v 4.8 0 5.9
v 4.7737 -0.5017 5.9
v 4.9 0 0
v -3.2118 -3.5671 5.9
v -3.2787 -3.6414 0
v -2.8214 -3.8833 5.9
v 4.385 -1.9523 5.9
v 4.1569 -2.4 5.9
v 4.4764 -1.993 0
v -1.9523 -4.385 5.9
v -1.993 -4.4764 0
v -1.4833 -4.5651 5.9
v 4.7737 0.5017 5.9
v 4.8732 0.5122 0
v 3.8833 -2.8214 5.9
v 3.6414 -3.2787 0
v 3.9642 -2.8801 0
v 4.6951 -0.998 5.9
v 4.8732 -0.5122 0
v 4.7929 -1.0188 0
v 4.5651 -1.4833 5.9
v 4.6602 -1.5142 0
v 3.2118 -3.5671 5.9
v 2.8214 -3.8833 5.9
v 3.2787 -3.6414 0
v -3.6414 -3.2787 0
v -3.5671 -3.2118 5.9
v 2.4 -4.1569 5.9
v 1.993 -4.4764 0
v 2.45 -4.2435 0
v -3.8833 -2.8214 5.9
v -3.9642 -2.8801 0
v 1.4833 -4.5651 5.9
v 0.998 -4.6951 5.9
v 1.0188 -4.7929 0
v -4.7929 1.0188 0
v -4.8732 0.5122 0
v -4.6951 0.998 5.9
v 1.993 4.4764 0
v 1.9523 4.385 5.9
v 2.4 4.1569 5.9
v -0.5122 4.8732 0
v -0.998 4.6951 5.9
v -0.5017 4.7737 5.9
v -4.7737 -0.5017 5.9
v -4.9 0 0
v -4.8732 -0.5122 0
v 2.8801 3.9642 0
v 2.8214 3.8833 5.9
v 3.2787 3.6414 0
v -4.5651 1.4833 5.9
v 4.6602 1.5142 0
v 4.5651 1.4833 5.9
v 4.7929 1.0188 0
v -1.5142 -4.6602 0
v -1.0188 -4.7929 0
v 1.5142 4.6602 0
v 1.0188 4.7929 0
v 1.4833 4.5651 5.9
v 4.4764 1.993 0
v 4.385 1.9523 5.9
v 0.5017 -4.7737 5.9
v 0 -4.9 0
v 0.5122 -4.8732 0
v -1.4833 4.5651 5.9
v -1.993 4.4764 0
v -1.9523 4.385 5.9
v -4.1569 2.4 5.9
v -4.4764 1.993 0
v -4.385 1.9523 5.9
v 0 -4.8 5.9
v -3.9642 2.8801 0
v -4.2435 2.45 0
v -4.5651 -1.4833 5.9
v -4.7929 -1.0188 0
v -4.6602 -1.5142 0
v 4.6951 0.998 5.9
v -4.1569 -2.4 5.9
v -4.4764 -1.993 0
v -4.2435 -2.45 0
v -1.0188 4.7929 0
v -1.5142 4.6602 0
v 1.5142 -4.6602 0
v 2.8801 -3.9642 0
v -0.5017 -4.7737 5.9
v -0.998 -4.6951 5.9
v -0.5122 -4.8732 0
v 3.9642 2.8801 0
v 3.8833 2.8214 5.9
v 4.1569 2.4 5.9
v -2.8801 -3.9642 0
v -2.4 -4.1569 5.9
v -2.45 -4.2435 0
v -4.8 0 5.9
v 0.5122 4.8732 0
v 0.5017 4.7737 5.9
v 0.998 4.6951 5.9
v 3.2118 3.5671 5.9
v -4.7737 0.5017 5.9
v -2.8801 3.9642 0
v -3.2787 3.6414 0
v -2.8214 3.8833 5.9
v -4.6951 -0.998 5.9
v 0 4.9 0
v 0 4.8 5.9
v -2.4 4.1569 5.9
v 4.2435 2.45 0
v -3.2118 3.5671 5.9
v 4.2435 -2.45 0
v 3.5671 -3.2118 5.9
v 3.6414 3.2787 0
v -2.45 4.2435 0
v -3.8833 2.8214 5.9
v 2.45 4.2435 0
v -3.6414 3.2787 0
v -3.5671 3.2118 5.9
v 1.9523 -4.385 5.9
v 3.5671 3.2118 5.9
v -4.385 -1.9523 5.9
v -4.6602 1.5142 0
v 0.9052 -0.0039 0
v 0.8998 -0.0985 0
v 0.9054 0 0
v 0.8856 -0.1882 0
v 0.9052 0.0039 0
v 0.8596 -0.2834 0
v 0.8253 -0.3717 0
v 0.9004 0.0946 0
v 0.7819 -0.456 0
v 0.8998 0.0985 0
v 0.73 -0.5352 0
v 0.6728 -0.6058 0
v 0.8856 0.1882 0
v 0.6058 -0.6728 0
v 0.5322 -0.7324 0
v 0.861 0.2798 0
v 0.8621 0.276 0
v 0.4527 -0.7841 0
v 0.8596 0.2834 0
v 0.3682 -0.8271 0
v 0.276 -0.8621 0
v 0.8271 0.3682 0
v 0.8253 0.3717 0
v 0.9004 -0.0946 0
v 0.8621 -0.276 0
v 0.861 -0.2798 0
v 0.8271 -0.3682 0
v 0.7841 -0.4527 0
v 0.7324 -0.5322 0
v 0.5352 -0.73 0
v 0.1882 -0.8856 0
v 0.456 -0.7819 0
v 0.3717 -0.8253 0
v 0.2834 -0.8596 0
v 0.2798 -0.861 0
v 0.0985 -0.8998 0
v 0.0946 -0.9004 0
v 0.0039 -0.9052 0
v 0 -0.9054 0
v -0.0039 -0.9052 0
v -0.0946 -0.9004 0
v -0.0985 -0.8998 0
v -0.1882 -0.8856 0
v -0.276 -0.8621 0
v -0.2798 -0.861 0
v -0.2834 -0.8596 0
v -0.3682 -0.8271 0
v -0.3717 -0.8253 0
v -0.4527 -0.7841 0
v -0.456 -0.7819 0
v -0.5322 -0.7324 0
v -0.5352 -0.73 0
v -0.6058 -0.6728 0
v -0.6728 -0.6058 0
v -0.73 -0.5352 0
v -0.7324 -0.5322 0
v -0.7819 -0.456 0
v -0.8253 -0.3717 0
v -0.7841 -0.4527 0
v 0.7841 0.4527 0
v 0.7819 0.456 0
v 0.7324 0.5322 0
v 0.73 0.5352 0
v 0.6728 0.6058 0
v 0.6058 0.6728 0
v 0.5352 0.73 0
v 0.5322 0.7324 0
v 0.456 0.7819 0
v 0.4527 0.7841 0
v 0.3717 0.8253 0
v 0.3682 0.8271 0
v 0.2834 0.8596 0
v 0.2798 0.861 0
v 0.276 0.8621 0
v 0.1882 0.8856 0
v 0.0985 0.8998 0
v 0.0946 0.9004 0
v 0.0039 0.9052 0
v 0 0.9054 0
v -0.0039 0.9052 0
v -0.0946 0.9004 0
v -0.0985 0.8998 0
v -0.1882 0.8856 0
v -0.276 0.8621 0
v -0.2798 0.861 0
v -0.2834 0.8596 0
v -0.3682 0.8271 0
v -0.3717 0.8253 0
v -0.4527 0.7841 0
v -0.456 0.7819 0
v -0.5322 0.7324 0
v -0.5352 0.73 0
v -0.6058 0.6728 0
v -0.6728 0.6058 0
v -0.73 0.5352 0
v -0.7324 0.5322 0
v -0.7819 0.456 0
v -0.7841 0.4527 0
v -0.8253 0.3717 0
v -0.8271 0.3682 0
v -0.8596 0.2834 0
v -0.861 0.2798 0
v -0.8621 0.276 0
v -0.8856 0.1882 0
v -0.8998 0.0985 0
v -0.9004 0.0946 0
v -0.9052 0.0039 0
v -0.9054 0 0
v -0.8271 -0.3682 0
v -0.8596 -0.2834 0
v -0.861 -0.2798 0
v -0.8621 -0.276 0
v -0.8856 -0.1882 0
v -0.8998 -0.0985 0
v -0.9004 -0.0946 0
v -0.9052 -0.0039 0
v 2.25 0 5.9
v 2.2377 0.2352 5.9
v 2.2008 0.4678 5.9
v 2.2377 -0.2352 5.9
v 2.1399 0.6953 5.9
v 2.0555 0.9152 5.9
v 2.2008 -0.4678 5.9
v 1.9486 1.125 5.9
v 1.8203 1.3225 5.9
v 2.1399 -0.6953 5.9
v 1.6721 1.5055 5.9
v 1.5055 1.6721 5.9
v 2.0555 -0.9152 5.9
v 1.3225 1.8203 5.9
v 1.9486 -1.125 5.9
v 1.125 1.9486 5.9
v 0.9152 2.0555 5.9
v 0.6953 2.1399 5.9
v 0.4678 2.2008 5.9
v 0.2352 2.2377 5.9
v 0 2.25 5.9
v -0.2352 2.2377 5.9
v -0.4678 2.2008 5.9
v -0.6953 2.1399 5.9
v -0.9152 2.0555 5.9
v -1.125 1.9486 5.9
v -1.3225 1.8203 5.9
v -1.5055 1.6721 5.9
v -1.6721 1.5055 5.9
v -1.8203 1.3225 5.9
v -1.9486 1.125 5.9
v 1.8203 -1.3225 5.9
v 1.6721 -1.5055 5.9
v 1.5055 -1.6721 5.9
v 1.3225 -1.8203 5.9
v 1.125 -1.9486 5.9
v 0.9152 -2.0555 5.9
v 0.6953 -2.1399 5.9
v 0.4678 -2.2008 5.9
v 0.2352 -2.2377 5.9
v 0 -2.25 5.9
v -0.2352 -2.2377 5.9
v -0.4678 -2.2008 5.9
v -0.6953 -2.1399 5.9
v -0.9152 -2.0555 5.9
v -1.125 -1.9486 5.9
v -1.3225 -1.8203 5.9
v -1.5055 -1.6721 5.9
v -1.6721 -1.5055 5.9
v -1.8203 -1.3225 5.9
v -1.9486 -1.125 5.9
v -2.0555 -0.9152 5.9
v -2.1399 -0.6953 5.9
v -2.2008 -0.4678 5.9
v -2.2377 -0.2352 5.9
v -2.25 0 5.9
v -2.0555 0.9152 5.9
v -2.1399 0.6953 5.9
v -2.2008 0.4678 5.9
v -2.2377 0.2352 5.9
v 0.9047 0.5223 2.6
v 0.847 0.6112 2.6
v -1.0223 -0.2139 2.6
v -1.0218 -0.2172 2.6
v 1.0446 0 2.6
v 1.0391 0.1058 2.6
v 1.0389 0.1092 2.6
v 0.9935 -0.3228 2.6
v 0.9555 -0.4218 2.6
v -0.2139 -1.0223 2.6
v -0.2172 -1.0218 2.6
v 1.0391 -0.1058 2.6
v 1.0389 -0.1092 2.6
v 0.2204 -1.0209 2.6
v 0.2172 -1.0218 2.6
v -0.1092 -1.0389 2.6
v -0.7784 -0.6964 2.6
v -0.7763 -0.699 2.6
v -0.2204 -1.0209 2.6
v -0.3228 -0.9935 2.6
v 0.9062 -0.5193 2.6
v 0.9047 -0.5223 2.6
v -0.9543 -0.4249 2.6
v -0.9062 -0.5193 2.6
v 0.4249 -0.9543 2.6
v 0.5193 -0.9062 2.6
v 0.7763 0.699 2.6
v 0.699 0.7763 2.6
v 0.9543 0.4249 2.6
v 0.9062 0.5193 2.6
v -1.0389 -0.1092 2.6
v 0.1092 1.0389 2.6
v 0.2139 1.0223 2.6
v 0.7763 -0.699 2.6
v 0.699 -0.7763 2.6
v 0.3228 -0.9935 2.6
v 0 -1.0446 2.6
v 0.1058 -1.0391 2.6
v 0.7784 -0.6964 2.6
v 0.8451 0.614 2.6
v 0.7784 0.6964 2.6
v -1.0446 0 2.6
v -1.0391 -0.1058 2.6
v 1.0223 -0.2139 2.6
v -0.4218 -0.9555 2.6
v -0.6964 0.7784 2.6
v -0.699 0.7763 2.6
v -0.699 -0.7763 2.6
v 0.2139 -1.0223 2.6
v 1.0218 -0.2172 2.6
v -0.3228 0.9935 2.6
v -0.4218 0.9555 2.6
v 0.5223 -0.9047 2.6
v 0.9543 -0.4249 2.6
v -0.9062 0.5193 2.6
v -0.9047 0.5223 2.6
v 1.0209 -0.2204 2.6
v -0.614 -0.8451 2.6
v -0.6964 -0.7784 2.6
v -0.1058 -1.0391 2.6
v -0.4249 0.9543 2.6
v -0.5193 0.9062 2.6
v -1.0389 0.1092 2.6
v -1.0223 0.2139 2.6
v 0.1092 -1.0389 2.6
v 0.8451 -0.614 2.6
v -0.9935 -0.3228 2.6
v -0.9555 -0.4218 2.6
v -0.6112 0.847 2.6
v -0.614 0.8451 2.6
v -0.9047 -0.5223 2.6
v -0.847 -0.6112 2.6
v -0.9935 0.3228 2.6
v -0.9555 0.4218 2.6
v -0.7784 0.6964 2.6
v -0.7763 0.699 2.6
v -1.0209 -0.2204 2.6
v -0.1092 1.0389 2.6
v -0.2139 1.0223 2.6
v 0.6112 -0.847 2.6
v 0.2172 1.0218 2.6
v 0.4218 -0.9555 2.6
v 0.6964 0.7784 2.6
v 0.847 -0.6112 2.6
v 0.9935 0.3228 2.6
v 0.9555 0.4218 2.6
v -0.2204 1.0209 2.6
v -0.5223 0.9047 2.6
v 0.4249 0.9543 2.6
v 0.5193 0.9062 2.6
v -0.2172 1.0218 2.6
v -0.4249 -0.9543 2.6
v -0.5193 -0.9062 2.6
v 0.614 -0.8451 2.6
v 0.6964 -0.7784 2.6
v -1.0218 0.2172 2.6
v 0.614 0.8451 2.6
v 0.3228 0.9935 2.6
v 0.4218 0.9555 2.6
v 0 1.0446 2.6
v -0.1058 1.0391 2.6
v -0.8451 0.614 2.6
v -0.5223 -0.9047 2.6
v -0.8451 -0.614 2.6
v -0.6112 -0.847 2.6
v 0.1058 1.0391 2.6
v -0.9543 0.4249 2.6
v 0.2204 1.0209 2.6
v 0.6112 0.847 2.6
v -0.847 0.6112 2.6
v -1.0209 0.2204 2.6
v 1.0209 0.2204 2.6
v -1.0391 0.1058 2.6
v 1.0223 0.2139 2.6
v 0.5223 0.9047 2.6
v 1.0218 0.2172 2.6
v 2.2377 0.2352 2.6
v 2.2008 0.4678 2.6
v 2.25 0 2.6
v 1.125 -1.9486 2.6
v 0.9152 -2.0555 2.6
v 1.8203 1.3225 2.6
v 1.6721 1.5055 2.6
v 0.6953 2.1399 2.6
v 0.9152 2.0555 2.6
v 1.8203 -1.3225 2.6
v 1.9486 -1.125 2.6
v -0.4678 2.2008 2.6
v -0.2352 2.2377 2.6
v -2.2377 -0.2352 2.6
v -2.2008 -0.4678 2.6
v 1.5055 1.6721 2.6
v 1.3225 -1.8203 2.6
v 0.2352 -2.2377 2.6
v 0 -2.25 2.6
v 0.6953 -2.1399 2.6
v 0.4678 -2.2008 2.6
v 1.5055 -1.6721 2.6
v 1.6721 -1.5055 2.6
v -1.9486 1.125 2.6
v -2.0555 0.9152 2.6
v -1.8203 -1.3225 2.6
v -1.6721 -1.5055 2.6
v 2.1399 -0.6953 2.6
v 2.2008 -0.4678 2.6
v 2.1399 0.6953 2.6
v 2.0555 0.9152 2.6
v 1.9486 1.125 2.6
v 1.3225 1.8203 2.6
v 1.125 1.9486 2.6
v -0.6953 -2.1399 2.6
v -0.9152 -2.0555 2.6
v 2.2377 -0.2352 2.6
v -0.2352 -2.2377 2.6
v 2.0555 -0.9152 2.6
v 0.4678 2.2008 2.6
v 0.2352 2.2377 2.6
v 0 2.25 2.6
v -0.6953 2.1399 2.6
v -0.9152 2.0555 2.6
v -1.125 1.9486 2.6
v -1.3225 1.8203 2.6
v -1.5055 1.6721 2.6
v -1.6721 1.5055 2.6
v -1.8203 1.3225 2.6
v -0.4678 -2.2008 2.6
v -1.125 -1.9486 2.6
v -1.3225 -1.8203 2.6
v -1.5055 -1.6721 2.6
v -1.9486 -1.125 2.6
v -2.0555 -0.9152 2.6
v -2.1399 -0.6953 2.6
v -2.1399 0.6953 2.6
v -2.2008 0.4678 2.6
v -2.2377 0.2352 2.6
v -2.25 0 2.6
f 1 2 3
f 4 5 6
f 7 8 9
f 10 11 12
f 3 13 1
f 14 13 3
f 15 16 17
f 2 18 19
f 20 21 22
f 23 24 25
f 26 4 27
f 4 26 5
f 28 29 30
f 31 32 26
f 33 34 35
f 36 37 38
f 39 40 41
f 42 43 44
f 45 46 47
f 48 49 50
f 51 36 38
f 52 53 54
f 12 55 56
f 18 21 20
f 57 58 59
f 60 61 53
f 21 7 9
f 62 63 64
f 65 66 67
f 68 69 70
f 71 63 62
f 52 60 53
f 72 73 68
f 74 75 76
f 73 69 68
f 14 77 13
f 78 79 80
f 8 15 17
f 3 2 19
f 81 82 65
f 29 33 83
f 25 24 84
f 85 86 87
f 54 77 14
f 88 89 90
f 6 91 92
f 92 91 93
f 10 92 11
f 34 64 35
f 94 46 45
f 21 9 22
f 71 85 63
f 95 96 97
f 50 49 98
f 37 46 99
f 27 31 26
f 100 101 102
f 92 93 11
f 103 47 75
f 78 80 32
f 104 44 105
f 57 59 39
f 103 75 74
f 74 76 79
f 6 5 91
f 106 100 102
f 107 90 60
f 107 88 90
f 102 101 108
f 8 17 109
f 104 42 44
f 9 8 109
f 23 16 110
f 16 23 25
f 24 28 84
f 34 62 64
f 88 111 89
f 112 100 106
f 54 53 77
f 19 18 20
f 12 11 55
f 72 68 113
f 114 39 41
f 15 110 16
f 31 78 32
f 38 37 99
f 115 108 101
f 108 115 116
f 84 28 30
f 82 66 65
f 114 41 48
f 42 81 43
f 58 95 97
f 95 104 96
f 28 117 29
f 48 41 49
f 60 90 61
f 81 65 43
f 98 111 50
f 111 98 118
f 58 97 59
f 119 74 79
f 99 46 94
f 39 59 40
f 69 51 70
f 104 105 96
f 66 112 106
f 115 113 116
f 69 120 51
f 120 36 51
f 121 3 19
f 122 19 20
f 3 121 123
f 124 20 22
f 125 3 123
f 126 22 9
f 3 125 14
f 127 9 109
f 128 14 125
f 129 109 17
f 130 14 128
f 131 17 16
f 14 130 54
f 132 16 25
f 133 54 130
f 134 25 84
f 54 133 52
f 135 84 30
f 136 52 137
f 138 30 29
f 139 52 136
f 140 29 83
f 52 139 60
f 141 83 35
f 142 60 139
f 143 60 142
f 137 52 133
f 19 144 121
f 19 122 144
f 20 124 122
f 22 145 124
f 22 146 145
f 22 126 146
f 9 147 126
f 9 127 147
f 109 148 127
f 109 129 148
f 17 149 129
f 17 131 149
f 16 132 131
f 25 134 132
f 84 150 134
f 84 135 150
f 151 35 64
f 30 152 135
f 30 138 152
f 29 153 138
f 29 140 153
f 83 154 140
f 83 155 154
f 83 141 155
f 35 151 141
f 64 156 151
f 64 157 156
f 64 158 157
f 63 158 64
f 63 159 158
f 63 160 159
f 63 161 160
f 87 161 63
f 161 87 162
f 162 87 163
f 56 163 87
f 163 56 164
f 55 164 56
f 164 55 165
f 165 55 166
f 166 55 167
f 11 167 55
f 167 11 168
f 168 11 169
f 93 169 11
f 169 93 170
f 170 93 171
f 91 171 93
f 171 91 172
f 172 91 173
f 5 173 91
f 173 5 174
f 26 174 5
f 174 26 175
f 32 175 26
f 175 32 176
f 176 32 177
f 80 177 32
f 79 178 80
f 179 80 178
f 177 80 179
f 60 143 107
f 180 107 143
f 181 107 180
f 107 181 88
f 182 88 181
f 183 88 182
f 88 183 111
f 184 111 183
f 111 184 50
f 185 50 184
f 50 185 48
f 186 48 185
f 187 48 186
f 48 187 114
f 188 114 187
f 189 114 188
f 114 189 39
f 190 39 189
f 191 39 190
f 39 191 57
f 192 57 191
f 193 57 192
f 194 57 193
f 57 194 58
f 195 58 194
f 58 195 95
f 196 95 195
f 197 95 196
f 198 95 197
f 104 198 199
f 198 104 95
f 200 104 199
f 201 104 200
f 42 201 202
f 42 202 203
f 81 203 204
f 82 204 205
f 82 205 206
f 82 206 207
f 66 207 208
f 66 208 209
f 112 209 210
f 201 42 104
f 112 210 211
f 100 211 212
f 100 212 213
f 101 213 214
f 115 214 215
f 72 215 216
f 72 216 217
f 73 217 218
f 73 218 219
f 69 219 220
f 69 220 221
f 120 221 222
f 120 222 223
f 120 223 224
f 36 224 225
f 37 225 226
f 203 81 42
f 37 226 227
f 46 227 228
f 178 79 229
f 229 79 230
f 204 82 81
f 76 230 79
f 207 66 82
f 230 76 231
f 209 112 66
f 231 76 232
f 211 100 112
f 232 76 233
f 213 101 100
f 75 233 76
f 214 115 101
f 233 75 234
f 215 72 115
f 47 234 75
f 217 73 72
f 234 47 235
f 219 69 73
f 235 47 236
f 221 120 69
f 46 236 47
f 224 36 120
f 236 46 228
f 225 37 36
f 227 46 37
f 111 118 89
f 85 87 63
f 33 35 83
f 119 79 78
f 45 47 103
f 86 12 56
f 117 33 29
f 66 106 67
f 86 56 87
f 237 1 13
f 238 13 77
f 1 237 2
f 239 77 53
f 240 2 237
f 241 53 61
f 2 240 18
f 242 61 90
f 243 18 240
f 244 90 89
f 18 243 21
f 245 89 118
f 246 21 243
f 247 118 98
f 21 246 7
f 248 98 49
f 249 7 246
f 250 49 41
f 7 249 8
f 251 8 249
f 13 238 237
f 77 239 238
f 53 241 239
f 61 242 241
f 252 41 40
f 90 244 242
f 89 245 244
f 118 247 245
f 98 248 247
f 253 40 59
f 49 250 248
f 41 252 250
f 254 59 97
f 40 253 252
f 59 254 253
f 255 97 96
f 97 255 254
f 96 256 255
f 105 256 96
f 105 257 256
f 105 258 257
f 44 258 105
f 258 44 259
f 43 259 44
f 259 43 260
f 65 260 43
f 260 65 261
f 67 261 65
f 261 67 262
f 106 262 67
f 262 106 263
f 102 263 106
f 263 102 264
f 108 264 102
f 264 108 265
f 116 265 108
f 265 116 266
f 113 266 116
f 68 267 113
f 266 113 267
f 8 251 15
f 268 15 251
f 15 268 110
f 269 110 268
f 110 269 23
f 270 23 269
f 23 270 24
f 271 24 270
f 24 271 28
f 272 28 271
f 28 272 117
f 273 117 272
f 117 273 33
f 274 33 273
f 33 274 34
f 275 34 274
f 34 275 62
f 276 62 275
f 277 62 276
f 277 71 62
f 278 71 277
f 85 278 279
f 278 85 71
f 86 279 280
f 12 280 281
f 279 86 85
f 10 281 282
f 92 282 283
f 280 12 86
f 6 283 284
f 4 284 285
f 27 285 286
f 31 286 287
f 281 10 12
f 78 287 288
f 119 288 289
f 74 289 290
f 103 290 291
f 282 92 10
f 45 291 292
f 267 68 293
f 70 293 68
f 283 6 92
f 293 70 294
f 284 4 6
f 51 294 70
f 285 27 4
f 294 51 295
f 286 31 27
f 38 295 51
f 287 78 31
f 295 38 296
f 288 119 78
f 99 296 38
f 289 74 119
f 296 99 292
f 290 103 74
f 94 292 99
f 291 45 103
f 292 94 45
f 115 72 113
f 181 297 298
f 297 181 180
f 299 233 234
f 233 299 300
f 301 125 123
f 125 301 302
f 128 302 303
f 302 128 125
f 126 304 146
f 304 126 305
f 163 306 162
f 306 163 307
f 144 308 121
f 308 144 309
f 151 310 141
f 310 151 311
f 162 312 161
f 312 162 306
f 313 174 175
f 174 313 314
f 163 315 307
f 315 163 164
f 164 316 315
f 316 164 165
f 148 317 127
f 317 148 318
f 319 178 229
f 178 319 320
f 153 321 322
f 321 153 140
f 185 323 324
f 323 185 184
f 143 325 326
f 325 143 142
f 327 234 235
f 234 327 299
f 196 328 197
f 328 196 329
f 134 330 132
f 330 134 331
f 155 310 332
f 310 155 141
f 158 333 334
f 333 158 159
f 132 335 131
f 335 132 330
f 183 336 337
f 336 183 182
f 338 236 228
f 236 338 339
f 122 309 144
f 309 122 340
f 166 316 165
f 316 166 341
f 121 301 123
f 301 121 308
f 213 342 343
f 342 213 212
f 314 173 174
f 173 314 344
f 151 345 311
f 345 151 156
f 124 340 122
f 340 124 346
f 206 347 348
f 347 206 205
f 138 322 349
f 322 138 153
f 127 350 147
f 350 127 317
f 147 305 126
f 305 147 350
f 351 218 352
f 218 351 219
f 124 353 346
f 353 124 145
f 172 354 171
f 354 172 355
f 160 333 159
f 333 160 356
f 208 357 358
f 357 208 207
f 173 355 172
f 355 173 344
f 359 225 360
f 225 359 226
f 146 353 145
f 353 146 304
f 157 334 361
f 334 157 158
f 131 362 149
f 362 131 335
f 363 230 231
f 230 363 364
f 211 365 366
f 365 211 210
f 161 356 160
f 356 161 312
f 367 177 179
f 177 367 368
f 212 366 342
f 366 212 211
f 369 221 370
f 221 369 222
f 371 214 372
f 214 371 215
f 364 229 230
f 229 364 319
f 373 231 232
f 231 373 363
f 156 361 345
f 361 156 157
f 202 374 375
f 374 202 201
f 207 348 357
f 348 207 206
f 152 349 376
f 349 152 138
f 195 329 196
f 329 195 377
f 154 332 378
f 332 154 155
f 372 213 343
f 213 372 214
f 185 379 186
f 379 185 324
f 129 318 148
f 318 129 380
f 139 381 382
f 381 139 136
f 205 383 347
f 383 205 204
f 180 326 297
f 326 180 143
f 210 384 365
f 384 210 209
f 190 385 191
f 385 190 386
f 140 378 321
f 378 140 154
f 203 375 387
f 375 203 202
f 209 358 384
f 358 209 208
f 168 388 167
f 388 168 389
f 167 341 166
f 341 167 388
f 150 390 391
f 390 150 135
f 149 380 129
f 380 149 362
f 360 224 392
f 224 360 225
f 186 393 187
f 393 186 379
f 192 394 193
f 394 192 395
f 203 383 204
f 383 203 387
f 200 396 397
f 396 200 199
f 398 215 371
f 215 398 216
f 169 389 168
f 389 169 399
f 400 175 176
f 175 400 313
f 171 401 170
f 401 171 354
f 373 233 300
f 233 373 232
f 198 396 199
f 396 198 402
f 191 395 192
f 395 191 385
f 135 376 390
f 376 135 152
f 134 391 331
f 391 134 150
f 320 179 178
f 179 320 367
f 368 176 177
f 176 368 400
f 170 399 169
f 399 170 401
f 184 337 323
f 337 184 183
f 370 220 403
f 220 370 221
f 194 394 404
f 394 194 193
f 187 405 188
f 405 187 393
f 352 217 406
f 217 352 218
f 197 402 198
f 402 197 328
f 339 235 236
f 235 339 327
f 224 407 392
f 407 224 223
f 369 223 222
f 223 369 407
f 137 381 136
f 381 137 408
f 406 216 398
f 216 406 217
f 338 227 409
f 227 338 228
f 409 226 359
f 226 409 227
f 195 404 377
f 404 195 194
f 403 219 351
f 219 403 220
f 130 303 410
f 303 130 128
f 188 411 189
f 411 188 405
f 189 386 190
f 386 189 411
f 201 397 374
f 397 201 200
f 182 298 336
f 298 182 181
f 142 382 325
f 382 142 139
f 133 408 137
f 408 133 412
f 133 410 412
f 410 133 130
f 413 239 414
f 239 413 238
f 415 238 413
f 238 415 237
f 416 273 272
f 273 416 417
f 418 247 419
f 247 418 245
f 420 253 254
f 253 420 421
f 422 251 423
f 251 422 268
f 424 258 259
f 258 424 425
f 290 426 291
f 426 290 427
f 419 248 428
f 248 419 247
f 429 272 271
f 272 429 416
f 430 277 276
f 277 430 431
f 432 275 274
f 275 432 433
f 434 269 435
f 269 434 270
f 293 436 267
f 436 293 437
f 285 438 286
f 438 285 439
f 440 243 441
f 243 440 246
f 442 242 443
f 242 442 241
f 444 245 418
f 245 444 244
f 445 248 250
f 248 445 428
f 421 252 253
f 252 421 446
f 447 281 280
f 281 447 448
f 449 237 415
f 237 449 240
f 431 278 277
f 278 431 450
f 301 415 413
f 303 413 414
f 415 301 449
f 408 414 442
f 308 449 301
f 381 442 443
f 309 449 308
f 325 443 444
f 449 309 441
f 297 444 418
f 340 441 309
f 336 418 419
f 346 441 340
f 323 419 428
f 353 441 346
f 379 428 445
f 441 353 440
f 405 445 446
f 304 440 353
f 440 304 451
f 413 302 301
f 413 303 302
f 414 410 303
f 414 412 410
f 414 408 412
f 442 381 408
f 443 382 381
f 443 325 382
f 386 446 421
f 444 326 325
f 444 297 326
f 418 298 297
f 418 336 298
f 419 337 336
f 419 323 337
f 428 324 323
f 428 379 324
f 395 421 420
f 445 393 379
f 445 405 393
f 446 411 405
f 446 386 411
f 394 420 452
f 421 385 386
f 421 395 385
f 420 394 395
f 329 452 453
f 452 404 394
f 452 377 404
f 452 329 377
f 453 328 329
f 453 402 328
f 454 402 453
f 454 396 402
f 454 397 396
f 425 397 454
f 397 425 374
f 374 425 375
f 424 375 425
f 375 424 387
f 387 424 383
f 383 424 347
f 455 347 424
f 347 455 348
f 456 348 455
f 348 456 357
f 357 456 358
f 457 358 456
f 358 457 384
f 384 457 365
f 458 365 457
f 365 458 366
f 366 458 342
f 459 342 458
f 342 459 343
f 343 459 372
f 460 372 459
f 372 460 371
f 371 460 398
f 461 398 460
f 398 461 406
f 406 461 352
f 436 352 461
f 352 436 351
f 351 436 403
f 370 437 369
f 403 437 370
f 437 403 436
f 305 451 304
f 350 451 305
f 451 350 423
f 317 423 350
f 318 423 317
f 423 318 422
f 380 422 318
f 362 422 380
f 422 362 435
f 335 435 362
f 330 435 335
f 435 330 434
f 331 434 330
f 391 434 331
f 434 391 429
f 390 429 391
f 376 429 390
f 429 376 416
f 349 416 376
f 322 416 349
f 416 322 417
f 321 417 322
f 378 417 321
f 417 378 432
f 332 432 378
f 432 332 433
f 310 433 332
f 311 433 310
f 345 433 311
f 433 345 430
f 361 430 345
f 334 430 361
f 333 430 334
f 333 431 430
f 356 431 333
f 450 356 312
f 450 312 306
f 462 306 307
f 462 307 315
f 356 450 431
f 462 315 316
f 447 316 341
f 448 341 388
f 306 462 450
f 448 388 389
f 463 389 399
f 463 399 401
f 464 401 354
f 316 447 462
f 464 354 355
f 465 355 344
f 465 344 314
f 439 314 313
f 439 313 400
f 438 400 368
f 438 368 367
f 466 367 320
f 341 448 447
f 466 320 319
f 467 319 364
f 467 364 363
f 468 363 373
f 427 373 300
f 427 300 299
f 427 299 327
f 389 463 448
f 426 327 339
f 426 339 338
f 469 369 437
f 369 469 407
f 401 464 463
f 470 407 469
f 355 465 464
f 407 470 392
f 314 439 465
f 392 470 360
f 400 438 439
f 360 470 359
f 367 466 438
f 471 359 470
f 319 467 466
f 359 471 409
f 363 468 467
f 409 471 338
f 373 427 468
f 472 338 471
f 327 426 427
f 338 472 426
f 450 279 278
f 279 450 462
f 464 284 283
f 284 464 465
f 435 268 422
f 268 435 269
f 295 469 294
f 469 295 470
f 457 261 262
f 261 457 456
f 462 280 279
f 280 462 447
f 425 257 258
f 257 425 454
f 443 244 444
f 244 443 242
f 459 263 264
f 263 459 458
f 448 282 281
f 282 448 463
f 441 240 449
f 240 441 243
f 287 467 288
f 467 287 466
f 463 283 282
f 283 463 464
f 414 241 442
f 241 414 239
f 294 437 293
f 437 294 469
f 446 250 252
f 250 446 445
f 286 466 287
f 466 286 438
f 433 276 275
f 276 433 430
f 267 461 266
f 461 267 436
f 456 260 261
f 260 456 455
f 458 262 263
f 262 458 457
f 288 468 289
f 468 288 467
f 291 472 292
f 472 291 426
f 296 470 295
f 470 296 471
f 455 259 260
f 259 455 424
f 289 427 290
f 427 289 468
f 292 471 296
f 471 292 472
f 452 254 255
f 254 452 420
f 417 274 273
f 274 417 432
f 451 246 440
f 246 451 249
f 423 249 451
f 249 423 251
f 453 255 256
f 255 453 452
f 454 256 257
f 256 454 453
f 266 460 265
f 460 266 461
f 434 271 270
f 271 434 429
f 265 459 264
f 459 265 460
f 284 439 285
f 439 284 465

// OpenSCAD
// PowerBook 5xx logic board standoff
// Copyright François Revol, 2025

/* [Printing options] */

// Optimize for FDM printers (less supports, larger details)
optimize_fdm = true;

/* [Hidden] */
$fs = $preview ? 0.5 : 0.1;
$fa = $preview ? 12 : 6;


module pb5xx_logicboard_standoff() {
    difference() {
        cylinder(d1=9.8,d2=9.6,h=5.9);
        translate([0,0,-0.1]) cylinder(d1=1.8,d2=2.1,h=2.8);
        translate([0,0,2.6]) cylinder(d=4.5,h=3.4);
        if ($preview) cube(10);
    }
}

pb5xx_logicboard_standoff();
